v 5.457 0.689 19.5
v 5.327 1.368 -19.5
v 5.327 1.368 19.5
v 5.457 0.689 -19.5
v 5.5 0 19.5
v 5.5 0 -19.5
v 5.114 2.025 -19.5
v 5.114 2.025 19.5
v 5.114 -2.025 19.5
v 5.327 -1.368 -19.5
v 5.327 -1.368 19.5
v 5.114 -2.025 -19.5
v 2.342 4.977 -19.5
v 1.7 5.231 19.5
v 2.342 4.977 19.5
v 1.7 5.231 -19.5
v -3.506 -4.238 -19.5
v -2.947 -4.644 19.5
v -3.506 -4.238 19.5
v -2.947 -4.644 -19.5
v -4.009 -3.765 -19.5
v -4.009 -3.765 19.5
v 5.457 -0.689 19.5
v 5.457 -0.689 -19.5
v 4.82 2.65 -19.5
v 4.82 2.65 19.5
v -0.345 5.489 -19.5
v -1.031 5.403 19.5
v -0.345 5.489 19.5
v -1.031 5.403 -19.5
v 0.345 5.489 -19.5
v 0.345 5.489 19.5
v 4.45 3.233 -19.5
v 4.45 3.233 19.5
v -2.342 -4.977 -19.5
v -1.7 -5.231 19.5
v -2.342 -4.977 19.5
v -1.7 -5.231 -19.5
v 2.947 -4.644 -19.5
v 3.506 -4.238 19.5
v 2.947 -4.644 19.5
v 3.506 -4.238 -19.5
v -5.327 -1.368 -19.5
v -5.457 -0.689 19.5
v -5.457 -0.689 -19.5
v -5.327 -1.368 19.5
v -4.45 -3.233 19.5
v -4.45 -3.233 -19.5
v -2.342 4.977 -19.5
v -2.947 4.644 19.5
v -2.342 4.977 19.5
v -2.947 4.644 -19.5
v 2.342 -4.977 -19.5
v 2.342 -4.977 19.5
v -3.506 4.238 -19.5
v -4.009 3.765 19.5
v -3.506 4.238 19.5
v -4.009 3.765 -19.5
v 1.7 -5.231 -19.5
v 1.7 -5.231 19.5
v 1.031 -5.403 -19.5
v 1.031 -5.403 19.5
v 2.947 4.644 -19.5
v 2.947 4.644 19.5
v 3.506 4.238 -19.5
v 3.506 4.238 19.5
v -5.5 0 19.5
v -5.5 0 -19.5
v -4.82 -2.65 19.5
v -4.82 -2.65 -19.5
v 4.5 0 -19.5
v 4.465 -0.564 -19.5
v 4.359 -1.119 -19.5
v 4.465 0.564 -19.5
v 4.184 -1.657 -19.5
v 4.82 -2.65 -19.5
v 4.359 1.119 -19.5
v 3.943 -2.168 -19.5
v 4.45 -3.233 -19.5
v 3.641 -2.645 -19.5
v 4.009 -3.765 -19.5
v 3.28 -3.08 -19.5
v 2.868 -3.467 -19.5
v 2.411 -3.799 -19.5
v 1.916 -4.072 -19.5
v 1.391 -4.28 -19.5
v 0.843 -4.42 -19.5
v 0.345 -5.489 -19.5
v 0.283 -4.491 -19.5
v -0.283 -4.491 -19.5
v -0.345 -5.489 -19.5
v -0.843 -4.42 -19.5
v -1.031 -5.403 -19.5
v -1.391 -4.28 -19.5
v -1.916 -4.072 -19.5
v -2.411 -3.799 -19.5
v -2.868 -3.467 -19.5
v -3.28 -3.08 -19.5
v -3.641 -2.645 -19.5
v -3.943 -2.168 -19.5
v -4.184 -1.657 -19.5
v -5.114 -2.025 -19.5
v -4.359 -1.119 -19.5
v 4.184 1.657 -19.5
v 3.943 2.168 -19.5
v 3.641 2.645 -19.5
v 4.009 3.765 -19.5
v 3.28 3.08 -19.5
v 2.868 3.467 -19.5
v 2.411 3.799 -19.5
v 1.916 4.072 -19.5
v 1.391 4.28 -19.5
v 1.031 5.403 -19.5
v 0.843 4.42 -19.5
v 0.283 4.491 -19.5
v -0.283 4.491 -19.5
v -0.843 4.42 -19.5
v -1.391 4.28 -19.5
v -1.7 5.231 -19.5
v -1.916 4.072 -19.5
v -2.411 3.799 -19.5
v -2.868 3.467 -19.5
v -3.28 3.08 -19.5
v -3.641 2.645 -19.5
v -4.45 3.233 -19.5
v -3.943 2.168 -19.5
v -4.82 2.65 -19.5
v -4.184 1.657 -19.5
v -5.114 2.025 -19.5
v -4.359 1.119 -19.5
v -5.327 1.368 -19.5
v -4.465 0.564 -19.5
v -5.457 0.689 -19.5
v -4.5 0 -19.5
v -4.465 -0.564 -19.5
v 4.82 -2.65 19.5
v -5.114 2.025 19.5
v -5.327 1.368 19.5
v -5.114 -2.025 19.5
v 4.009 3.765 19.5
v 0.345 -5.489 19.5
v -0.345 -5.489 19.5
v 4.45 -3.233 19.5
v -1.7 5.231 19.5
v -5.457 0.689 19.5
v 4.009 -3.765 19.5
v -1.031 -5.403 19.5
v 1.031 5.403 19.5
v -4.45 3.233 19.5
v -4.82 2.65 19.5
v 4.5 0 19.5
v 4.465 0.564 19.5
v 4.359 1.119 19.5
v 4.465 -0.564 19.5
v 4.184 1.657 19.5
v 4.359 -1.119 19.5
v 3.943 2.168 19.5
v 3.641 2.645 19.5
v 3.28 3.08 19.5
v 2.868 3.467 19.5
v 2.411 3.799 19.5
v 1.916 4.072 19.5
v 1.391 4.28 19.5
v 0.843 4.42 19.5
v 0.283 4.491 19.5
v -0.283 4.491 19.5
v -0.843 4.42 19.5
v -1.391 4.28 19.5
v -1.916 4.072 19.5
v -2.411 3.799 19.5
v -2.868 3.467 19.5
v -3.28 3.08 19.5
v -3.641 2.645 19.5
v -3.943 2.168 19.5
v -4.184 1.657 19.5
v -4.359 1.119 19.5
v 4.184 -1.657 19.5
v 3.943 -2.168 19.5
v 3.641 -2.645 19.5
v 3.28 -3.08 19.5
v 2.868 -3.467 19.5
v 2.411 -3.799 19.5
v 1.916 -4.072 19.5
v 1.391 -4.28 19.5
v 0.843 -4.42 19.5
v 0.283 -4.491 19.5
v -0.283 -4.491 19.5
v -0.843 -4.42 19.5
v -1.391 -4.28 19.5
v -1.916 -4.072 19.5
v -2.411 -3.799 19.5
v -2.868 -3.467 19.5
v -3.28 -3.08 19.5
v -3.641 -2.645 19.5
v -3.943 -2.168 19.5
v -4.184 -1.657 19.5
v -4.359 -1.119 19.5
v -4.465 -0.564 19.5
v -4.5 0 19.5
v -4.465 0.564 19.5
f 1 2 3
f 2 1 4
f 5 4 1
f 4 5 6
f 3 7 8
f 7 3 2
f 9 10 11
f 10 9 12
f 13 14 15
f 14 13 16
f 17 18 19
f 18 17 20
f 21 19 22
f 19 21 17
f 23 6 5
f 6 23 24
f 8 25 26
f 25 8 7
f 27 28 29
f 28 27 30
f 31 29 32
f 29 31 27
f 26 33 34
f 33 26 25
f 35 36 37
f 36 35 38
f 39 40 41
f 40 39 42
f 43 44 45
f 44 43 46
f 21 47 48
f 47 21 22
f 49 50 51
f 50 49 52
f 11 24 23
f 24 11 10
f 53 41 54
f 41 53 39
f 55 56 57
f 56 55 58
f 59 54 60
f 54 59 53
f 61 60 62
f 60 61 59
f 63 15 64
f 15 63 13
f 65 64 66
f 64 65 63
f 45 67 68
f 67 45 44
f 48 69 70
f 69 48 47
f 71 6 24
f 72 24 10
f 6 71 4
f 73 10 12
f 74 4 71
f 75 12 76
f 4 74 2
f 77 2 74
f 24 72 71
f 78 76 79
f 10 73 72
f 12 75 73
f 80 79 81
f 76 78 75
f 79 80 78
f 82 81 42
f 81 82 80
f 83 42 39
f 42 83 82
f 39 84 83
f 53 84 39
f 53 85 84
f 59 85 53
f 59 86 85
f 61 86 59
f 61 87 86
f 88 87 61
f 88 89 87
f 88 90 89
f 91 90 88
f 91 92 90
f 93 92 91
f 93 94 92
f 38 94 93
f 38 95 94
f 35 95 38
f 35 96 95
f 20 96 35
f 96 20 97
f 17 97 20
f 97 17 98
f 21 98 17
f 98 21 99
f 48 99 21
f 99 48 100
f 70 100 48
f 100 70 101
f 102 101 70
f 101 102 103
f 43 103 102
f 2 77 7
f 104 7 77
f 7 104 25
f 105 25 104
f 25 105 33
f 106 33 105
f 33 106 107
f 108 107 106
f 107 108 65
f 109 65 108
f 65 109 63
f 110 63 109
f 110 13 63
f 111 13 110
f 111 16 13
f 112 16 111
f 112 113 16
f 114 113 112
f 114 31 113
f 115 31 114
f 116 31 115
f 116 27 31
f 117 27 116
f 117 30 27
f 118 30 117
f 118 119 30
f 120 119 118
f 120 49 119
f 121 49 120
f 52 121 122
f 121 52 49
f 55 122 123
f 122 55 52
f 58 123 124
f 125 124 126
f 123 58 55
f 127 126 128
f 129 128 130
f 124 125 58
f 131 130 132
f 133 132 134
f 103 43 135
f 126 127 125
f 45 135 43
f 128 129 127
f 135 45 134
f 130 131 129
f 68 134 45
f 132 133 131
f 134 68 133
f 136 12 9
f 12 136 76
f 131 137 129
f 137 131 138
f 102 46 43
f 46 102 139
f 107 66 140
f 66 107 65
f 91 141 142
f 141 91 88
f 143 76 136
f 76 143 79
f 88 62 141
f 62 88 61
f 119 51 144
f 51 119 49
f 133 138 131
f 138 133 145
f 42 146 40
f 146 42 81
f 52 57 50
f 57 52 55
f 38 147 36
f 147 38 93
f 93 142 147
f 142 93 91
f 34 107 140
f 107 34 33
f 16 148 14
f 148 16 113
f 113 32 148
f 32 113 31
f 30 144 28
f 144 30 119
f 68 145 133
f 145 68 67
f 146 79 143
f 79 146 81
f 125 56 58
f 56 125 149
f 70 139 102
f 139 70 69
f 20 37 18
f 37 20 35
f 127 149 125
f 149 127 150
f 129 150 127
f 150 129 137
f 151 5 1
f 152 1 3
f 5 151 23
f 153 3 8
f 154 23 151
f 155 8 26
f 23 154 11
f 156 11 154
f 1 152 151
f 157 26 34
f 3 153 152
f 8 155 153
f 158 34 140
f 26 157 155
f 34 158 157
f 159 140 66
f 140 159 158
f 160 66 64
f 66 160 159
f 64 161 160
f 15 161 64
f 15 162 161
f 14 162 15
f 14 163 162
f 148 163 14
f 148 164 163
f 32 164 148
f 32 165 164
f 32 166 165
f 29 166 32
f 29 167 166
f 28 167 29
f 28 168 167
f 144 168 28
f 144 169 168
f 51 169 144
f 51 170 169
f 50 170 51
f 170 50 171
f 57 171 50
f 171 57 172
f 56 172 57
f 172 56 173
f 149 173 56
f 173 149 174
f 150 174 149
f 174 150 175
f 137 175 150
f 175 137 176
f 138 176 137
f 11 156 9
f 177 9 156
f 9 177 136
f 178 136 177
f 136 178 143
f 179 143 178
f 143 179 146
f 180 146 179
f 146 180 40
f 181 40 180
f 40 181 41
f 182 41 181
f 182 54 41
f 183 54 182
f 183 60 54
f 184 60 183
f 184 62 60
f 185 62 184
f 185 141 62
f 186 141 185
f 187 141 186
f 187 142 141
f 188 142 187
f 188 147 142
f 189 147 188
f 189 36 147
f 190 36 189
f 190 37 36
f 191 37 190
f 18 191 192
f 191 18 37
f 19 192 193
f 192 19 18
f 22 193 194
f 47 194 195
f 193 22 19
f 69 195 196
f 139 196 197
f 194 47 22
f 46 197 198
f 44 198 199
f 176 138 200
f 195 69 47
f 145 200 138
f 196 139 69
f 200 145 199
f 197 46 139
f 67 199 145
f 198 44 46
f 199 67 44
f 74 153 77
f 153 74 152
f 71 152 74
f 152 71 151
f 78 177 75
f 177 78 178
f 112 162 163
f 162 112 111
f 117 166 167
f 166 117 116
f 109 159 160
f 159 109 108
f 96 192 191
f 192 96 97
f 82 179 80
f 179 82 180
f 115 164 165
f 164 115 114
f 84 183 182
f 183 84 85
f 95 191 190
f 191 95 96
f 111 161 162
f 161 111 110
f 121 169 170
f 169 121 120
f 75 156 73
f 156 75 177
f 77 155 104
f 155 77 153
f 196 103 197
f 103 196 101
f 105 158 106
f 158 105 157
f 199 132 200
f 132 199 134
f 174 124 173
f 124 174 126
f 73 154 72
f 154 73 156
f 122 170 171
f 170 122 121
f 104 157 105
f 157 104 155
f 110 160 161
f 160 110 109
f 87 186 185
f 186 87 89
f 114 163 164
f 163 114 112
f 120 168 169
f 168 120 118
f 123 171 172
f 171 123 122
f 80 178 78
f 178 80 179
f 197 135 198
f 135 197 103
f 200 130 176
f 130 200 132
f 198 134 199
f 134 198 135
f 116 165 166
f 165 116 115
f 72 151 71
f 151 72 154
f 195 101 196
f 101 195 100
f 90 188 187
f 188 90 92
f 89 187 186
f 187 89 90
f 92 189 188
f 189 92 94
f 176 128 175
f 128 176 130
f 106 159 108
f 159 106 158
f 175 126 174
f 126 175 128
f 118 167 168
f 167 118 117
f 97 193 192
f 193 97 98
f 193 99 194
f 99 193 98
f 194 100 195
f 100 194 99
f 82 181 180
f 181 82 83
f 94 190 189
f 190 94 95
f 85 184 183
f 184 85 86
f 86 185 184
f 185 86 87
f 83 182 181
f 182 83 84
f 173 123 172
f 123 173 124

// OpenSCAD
$fn = 50;


difference() {
	union() {
		translate(v = [0, 0, -19.5000000000]) {
			cylinder(h = 39, r = 5.5000000000);
		}
	}
	union() {
		translate(v = [0, 0, -100.0000000000]) {
			cylinder(h = 200, r = 4.5000000000);
		}
	}
}
